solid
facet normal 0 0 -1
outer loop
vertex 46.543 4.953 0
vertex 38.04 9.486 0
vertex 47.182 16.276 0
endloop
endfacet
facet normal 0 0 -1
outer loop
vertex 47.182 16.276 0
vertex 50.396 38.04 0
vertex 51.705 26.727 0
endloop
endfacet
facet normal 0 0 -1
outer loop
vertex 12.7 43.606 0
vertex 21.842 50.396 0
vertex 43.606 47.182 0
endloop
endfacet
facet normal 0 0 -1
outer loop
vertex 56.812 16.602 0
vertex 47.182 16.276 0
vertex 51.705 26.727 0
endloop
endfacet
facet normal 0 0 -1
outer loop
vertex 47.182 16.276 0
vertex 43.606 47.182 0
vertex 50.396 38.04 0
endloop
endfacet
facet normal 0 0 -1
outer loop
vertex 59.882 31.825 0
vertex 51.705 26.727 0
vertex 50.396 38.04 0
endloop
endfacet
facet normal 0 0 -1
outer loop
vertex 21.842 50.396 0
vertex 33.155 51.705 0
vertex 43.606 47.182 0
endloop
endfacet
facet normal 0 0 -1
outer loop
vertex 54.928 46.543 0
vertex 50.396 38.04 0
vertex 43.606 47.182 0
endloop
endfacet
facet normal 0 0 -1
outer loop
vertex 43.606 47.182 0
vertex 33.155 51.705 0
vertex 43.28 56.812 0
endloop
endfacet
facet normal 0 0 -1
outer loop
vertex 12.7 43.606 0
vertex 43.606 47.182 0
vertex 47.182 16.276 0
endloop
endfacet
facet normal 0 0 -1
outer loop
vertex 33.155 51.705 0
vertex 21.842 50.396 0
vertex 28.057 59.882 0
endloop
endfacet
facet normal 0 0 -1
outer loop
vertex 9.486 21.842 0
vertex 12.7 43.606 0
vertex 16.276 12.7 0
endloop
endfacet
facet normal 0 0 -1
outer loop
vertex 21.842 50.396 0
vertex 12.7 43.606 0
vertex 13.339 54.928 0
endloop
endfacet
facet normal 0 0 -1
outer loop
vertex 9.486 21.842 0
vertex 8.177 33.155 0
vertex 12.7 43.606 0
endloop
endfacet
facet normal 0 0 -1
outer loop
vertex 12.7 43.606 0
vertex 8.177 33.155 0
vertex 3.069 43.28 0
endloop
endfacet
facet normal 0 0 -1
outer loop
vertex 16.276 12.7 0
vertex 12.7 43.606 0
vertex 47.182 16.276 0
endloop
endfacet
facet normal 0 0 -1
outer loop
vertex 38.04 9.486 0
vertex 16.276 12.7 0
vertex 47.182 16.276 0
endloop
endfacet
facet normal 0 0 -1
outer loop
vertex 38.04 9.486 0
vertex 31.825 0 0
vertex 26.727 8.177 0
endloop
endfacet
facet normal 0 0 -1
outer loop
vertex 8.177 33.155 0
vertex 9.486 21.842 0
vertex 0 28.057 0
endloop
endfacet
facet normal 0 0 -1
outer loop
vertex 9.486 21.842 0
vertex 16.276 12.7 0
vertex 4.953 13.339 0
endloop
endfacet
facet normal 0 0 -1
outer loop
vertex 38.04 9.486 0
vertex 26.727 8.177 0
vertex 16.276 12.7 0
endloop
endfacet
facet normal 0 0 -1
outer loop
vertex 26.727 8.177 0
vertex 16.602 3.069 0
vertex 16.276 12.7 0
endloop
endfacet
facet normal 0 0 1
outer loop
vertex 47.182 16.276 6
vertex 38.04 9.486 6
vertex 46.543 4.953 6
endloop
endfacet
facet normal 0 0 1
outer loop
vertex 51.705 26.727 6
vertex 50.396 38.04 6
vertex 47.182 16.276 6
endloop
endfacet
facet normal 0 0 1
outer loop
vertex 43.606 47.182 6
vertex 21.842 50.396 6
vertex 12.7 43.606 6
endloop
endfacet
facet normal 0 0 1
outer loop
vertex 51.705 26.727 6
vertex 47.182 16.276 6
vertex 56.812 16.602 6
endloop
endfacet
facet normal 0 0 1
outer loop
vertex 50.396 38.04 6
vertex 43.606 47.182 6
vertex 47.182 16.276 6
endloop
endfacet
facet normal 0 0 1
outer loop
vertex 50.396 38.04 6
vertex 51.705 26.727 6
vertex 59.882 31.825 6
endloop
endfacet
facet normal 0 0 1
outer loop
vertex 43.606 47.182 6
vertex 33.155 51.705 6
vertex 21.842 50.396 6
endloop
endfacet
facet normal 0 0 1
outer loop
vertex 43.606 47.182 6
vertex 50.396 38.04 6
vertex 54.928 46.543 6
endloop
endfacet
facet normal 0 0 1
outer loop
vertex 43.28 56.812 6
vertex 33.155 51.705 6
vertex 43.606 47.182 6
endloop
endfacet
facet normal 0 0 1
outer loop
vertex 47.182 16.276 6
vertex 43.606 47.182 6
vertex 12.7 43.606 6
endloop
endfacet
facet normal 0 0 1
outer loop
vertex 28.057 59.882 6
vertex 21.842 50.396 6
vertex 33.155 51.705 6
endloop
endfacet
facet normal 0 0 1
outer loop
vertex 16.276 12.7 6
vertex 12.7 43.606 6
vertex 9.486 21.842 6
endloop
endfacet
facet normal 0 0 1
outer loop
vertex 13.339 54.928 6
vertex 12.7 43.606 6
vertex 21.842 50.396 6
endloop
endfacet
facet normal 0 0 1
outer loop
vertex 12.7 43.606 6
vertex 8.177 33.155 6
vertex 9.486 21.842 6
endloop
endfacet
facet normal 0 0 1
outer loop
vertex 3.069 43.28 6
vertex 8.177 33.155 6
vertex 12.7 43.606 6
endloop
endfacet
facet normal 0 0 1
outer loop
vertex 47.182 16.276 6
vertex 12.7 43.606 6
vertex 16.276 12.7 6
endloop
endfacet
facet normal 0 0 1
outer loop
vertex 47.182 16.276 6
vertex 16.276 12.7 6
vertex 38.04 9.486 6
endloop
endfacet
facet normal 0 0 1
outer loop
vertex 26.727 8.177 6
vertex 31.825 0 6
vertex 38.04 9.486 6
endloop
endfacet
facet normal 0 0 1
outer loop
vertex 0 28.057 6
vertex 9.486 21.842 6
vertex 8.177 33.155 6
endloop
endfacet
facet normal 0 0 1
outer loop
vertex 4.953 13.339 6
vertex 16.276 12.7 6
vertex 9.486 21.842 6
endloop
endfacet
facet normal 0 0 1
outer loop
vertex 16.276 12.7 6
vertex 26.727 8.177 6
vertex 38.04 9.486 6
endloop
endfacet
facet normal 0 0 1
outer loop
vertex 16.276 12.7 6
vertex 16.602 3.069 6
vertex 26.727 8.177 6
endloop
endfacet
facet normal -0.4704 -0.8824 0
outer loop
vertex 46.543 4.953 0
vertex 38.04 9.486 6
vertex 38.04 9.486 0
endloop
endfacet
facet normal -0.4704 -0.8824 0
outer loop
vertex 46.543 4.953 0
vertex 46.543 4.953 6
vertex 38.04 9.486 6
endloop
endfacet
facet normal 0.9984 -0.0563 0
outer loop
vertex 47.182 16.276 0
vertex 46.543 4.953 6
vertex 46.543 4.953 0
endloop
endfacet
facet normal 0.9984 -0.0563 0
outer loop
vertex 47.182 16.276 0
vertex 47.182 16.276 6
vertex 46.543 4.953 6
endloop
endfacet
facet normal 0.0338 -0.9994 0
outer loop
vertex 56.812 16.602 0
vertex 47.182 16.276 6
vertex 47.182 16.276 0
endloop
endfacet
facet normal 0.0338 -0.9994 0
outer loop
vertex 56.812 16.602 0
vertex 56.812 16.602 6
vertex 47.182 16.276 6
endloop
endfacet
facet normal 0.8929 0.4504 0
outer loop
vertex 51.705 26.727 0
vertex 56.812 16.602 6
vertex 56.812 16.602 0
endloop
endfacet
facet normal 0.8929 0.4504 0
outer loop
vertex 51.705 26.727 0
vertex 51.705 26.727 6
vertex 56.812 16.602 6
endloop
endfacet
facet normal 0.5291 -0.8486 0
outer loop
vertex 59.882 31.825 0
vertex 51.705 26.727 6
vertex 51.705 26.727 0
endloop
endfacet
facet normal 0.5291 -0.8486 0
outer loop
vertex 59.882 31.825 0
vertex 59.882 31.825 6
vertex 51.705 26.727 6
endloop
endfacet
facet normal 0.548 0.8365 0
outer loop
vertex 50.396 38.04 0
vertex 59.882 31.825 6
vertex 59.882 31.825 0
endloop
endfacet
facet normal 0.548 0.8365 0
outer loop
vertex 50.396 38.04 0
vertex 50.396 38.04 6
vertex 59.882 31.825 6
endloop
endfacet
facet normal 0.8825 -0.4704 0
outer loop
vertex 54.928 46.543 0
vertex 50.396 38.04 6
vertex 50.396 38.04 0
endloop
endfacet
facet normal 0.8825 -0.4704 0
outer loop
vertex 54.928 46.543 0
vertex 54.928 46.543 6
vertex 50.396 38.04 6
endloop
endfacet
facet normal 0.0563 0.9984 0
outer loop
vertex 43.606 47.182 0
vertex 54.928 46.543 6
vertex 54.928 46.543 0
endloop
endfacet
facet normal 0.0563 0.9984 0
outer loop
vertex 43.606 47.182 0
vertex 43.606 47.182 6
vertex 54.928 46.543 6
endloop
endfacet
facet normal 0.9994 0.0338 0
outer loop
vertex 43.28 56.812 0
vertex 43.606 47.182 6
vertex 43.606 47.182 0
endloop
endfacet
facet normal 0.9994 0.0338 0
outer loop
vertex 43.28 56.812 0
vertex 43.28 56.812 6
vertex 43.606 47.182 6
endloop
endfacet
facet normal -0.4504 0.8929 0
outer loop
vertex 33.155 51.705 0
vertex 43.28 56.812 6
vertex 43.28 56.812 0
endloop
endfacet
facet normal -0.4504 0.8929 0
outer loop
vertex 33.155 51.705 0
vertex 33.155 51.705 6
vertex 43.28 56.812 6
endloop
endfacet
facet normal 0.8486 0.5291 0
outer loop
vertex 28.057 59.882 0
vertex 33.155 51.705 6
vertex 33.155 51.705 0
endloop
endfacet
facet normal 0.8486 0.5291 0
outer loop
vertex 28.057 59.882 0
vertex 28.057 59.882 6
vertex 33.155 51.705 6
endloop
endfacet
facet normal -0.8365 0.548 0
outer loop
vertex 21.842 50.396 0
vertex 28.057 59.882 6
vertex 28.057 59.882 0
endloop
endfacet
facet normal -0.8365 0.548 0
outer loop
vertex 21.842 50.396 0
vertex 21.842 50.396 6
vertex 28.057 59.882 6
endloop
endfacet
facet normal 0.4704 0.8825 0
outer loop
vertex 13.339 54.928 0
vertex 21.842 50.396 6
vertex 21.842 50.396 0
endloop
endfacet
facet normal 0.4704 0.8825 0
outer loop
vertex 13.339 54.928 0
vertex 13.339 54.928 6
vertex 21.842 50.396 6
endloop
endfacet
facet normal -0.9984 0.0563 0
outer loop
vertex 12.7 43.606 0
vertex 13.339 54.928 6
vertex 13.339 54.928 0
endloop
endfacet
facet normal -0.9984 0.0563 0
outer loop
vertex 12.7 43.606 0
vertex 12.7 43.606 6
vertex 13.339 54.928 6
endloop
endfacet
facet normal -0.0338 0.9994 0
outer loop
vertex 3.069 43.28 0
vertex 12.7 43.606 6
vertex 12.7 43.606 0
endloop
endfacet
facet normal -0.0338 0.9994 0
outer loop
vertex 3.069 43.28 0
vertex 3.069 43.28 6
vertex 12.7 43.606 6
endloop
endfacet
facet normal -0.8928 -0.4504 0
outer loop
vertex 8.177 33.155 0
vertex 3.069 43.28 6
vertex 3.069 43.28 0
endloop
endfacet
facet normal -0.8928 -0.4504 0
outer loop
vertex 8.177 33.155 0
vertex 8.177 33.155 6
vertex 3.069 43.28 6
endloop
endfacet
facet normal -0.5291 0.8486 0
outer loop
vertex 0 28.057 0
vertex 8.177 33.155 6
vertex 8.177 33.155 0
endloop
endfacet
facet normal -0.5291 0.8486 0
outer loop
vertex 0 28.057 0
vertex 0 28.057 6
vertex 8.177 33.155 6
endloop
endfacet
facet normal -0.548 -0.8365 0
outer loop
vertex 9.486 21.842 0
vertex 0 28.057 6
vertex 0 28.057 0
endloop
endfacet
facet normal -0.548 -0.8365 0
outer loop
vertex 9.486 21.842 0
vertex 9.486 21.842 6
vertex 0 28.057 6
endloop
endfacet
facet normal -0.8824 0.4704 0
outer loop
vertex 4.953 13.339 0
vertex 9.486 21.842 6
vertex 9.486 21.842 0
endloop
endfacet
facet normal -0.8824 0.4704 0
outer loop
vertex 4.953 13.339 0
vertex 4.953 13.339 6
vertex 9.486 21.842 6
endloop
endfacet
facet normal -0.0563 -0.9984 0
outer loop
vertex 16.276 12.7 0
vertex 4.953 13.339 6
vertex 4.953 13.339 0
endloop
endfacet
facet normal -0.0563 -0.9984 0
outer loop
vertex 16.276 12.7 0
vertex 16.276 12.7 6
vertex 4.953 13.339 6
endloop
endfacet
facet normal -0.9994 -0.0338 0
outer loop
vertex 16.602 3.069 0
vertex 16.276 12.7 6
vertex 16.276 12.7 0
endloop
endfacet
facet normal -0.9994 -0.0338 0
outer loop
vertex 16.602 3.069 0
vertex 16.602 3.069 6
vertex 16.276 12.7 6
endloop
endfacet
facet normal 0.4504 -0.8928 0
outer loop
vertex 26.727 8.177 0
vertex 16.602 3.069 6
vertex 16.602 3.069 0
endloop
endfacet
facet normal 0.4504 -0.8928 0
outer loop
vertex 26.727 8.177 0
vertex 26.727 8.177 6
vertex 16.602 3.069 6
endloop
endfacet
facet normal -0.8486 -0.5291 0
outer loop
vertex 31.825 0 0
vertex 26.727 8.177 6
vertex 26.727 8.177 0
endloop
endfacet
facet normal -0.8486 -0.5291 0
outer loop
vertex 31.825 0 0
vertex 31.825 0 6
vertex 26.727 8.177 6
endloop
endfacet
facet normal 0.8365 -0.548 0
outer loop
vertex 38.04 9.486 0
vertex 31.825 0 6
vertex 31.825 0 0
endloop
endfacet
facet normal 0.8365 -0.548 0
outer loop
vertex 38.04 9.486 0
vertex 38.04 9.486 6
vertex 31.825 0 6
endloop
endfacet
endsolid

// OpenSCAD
$fn = 32;

// ----------------------------------------------------------------------
// Chain sprocket: 12 teeth, 22 mm root radius
// ----------------------------------------------------------------------

// --- parameters (mm) ---
profile_height = 6;       // extrusion height
profile_points = 24;      // points of the closed outline

profile = [[51.705, 26.727], [59.882, 31.825], [50.396, 38.04], [54.928, 46.543], [43.606, 47.182], [43.28, 56.812], [33.155, 51.705], [28.057, 59.882], [21.842, 50.396], [13.339, 54.928], [12.7, 43.606], [3.069, 43.28], [8.177, 33.155], [0, 28.057], [9.486, 21.842], [4.953, 13.339], [16.276, 12.7], [16.602, 3.069], [26.727, 8.177], [31.825, 0], [38.04, 9.486], [46.543, 4.953], [47.182, 16.276], [56.812, 16.602]];  // single closed polygon, 24 points, counter clockwise

// --- the one profile operation ---
linear_extrude(height = profile_height) polygon(points = profile);
